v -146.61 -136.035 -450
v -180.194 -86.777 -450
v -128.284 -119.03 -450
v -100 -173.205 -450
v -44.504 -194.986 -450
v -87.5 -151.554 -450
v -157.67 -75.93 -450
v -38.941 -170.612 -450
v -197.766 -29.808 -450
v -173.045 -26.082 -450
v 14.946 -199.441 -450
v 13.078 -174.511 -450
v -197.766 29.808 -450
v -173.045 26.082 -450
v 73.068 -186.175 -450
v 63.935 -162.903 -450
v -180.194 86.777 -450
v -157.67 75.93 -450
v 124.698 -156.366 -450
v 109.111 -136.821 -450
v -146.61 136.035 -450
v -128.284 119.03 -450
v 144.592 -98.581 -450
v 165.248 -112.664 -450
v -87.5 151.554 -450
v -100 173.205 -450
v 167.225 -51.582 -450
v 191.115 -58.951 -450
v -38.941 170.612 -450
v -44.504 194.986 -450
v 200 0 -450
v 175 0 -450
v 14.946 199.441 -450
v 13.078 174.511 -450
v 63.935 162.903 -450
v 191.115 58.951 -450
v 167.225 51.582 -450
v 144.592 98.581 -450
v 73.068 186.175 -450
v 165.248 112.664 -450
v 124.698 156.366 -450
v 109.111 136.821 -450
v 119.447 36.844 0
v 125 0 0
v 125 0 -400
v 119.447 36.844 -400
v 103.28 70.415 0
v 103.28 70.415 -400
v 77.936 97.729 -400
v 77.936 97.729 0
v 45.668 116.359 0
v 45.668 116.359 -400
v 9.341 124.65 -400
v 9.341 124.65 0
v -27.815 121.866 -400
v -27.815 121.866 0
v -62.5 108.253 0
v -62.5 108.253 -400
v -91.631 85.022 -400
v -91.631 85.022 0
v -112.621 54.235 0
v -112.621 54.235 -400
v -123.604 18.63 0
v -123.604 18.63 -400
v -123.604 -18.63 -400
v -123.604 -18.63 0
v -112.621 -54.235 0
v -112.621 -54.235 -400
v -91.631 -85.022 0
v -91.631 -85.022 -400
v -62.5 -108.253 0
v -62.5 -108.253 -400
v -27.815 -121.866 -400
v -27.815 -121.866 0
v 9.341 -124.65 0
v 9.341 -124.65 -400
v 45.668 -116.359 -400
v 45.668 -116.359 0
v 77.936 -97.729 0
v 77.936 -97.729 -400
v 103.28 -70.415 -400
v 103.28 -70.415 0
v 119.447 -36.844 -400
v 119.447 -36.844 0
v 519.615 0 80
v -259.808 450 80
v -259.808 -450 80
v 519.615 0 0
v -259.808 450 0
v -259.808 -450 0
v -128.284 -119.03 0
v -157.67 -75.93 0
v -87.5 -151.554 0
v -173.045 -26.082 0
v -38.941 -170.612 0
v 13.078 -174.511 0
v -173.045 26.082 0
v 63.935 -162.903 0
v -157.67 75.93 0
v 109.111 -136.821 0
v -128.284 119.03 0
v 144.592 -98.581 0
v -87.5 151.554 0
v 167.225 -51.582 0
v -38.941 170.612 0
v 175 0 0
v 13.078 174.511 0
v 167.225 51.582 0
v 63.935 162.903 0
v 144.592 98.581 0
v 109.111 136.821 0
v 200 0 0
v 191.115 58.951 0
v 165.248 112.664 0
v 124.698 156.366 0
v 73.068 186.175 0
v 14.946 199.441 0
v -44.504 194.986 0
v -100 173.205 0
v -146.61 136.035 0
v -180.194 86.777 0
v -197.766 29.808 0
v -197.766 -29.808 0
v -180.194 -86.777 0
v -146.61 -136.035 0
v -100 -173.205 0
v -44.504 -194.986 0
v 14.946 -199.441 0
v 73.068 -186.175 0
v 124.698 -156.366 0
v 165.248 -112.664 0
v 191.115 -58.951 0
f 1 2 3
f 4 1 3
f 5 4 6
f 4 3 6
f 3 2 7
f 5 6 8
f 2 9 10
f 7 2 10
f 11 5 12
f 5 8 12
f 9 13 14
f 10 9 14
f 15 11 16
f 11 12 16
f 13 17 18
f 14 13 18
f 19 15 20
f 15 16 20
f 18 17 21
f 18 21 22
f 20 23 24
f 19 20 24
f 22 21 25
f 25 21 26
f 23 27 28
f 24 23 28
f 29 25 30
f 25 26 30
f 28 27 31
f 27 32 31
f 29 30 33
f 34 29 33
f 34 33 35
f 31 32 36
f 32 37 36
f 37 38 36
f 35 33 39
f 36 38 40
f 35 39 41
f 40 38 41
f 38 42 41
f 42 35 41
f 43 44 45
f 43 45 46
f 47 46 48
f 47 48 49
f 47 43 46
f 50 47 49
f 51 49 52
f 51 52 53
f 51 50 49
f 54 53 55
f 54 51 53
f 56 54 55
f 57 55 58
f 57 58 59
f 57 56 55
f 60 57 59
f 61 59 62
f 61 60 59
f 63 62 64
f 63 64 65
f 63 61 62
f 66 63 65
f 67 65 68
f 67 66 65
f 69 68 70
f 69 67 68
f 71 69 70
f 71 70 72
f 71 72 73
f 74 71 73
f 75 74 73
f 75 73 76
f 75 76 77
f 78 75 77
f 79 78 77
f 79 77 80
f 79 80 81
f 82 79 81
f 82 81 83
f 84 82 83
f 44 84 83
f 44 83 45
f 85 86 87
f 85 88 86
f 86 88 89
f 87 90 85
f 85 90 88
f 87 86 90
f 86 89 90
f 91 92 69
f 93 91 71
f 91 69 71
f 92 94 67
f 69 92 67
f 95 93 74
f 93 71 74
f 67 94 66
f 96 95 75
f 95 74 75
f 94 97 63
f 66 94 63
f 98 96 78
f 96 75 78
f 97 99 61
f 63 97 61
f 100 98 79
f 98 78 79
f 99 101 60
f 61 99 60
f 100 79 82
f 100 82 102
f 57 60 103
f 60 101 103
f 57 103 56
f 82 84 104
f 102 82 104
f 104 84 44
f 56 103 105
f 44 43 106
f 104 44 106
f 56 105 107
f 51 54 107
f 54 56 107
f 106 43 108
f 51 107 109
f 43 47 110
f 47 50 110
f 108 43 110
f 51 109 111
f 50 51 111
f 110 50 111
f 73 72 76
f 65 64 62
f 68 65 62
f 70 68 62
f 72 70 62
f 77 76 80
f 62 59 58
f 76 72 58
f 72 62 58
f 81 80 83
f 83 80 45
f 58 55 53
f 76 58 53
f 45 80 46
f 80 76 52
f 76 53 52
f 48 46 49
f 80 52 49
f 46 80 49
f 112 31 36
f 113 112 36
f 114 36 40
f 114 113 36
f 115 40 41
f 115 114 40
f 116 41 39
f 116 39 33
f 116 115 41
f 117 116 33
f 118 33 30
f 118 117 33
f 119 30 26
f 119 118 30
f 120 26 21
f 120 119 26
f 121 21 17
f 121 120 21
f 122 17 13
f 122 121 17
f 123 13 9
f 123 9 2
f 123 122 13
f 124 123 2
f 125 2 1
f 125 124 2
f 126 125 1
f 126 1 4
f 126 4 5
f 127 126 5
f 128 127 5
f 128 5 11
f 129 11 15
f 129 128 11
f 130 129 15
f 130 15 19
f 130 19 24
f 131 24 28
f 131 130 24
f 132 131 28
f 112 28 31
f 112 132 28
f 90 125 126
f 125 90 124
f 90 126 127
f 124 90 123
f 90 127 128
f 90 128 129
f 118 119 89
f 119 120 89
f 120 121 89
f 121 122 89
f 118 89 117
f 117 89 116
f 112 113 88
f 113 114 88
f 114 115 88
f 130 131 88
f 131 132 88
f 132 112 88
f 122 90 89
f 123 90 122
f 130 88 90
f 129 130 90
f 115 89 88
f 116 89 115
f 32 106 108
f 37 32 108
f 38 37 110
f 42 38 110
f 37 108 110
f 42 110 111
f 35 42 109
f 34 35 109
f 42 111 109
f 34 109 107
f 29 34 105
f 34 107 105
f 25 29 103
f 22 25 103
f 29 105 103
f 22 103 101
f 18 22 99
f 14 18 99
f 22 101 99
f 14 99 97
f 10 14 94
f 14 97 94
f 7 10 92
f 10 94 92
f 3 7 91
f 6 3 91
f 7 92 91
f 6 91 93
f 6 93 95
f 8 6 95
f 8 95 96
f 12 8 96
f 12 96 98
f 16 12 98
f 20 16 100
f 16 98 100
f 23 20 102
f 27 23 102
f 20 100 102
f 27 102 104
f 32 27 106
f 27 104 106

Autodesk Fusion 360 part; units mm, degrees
sketch "Sketch2" plane through (0, 0, 0) normal (0, 0, 1) x (1, 0, 0)
  line L0 (519.6152, 0) -> (-259.8076, 450)
  line L1 (-259.8076, 450) -> (-259.8076, -450)
  line L2 (-259.8076, -450) -> (519.6152, 0)
  dimension "d4" = 900
extrude "Extrude2" add sketch "Sketch2" along normal blind 80
sketch "Sketch3" plane through (0, 0, 0) normal (0, 0, 1) x (1, 0, 0)
  circle A0 centre (0, 0) radius 125
  circle A1 centre (0, 0) radius 200
  circle A2 centre (0, 0) radius 175
  dimension "d7" = 250
  dimension "d8" = 400
  dimension "d9" = 350
extrude "Extrude3" add sketch "Sketch3" against normal blind 200 contours A0
extrude "Extrude4" add sketch "Sketch3" against normal blind 500 contours A1
extrude "Extrude5" cut 1 faces at (62.6805, -21.2553, -200) along direction (0, 0, 1) blind 200
extrude "Extrude6" add sketch "Sketch3" against normal blind 400 contours A0
extrude "Extrude7" cut 1 faces at (190.2705, -18.6303, -500) along direction (0, 0, 1) blind 100
extrude "Extrude8" add 1 faces at (190.2705, -18.6303, -400) along direction (0, 0, -1) blind 50
